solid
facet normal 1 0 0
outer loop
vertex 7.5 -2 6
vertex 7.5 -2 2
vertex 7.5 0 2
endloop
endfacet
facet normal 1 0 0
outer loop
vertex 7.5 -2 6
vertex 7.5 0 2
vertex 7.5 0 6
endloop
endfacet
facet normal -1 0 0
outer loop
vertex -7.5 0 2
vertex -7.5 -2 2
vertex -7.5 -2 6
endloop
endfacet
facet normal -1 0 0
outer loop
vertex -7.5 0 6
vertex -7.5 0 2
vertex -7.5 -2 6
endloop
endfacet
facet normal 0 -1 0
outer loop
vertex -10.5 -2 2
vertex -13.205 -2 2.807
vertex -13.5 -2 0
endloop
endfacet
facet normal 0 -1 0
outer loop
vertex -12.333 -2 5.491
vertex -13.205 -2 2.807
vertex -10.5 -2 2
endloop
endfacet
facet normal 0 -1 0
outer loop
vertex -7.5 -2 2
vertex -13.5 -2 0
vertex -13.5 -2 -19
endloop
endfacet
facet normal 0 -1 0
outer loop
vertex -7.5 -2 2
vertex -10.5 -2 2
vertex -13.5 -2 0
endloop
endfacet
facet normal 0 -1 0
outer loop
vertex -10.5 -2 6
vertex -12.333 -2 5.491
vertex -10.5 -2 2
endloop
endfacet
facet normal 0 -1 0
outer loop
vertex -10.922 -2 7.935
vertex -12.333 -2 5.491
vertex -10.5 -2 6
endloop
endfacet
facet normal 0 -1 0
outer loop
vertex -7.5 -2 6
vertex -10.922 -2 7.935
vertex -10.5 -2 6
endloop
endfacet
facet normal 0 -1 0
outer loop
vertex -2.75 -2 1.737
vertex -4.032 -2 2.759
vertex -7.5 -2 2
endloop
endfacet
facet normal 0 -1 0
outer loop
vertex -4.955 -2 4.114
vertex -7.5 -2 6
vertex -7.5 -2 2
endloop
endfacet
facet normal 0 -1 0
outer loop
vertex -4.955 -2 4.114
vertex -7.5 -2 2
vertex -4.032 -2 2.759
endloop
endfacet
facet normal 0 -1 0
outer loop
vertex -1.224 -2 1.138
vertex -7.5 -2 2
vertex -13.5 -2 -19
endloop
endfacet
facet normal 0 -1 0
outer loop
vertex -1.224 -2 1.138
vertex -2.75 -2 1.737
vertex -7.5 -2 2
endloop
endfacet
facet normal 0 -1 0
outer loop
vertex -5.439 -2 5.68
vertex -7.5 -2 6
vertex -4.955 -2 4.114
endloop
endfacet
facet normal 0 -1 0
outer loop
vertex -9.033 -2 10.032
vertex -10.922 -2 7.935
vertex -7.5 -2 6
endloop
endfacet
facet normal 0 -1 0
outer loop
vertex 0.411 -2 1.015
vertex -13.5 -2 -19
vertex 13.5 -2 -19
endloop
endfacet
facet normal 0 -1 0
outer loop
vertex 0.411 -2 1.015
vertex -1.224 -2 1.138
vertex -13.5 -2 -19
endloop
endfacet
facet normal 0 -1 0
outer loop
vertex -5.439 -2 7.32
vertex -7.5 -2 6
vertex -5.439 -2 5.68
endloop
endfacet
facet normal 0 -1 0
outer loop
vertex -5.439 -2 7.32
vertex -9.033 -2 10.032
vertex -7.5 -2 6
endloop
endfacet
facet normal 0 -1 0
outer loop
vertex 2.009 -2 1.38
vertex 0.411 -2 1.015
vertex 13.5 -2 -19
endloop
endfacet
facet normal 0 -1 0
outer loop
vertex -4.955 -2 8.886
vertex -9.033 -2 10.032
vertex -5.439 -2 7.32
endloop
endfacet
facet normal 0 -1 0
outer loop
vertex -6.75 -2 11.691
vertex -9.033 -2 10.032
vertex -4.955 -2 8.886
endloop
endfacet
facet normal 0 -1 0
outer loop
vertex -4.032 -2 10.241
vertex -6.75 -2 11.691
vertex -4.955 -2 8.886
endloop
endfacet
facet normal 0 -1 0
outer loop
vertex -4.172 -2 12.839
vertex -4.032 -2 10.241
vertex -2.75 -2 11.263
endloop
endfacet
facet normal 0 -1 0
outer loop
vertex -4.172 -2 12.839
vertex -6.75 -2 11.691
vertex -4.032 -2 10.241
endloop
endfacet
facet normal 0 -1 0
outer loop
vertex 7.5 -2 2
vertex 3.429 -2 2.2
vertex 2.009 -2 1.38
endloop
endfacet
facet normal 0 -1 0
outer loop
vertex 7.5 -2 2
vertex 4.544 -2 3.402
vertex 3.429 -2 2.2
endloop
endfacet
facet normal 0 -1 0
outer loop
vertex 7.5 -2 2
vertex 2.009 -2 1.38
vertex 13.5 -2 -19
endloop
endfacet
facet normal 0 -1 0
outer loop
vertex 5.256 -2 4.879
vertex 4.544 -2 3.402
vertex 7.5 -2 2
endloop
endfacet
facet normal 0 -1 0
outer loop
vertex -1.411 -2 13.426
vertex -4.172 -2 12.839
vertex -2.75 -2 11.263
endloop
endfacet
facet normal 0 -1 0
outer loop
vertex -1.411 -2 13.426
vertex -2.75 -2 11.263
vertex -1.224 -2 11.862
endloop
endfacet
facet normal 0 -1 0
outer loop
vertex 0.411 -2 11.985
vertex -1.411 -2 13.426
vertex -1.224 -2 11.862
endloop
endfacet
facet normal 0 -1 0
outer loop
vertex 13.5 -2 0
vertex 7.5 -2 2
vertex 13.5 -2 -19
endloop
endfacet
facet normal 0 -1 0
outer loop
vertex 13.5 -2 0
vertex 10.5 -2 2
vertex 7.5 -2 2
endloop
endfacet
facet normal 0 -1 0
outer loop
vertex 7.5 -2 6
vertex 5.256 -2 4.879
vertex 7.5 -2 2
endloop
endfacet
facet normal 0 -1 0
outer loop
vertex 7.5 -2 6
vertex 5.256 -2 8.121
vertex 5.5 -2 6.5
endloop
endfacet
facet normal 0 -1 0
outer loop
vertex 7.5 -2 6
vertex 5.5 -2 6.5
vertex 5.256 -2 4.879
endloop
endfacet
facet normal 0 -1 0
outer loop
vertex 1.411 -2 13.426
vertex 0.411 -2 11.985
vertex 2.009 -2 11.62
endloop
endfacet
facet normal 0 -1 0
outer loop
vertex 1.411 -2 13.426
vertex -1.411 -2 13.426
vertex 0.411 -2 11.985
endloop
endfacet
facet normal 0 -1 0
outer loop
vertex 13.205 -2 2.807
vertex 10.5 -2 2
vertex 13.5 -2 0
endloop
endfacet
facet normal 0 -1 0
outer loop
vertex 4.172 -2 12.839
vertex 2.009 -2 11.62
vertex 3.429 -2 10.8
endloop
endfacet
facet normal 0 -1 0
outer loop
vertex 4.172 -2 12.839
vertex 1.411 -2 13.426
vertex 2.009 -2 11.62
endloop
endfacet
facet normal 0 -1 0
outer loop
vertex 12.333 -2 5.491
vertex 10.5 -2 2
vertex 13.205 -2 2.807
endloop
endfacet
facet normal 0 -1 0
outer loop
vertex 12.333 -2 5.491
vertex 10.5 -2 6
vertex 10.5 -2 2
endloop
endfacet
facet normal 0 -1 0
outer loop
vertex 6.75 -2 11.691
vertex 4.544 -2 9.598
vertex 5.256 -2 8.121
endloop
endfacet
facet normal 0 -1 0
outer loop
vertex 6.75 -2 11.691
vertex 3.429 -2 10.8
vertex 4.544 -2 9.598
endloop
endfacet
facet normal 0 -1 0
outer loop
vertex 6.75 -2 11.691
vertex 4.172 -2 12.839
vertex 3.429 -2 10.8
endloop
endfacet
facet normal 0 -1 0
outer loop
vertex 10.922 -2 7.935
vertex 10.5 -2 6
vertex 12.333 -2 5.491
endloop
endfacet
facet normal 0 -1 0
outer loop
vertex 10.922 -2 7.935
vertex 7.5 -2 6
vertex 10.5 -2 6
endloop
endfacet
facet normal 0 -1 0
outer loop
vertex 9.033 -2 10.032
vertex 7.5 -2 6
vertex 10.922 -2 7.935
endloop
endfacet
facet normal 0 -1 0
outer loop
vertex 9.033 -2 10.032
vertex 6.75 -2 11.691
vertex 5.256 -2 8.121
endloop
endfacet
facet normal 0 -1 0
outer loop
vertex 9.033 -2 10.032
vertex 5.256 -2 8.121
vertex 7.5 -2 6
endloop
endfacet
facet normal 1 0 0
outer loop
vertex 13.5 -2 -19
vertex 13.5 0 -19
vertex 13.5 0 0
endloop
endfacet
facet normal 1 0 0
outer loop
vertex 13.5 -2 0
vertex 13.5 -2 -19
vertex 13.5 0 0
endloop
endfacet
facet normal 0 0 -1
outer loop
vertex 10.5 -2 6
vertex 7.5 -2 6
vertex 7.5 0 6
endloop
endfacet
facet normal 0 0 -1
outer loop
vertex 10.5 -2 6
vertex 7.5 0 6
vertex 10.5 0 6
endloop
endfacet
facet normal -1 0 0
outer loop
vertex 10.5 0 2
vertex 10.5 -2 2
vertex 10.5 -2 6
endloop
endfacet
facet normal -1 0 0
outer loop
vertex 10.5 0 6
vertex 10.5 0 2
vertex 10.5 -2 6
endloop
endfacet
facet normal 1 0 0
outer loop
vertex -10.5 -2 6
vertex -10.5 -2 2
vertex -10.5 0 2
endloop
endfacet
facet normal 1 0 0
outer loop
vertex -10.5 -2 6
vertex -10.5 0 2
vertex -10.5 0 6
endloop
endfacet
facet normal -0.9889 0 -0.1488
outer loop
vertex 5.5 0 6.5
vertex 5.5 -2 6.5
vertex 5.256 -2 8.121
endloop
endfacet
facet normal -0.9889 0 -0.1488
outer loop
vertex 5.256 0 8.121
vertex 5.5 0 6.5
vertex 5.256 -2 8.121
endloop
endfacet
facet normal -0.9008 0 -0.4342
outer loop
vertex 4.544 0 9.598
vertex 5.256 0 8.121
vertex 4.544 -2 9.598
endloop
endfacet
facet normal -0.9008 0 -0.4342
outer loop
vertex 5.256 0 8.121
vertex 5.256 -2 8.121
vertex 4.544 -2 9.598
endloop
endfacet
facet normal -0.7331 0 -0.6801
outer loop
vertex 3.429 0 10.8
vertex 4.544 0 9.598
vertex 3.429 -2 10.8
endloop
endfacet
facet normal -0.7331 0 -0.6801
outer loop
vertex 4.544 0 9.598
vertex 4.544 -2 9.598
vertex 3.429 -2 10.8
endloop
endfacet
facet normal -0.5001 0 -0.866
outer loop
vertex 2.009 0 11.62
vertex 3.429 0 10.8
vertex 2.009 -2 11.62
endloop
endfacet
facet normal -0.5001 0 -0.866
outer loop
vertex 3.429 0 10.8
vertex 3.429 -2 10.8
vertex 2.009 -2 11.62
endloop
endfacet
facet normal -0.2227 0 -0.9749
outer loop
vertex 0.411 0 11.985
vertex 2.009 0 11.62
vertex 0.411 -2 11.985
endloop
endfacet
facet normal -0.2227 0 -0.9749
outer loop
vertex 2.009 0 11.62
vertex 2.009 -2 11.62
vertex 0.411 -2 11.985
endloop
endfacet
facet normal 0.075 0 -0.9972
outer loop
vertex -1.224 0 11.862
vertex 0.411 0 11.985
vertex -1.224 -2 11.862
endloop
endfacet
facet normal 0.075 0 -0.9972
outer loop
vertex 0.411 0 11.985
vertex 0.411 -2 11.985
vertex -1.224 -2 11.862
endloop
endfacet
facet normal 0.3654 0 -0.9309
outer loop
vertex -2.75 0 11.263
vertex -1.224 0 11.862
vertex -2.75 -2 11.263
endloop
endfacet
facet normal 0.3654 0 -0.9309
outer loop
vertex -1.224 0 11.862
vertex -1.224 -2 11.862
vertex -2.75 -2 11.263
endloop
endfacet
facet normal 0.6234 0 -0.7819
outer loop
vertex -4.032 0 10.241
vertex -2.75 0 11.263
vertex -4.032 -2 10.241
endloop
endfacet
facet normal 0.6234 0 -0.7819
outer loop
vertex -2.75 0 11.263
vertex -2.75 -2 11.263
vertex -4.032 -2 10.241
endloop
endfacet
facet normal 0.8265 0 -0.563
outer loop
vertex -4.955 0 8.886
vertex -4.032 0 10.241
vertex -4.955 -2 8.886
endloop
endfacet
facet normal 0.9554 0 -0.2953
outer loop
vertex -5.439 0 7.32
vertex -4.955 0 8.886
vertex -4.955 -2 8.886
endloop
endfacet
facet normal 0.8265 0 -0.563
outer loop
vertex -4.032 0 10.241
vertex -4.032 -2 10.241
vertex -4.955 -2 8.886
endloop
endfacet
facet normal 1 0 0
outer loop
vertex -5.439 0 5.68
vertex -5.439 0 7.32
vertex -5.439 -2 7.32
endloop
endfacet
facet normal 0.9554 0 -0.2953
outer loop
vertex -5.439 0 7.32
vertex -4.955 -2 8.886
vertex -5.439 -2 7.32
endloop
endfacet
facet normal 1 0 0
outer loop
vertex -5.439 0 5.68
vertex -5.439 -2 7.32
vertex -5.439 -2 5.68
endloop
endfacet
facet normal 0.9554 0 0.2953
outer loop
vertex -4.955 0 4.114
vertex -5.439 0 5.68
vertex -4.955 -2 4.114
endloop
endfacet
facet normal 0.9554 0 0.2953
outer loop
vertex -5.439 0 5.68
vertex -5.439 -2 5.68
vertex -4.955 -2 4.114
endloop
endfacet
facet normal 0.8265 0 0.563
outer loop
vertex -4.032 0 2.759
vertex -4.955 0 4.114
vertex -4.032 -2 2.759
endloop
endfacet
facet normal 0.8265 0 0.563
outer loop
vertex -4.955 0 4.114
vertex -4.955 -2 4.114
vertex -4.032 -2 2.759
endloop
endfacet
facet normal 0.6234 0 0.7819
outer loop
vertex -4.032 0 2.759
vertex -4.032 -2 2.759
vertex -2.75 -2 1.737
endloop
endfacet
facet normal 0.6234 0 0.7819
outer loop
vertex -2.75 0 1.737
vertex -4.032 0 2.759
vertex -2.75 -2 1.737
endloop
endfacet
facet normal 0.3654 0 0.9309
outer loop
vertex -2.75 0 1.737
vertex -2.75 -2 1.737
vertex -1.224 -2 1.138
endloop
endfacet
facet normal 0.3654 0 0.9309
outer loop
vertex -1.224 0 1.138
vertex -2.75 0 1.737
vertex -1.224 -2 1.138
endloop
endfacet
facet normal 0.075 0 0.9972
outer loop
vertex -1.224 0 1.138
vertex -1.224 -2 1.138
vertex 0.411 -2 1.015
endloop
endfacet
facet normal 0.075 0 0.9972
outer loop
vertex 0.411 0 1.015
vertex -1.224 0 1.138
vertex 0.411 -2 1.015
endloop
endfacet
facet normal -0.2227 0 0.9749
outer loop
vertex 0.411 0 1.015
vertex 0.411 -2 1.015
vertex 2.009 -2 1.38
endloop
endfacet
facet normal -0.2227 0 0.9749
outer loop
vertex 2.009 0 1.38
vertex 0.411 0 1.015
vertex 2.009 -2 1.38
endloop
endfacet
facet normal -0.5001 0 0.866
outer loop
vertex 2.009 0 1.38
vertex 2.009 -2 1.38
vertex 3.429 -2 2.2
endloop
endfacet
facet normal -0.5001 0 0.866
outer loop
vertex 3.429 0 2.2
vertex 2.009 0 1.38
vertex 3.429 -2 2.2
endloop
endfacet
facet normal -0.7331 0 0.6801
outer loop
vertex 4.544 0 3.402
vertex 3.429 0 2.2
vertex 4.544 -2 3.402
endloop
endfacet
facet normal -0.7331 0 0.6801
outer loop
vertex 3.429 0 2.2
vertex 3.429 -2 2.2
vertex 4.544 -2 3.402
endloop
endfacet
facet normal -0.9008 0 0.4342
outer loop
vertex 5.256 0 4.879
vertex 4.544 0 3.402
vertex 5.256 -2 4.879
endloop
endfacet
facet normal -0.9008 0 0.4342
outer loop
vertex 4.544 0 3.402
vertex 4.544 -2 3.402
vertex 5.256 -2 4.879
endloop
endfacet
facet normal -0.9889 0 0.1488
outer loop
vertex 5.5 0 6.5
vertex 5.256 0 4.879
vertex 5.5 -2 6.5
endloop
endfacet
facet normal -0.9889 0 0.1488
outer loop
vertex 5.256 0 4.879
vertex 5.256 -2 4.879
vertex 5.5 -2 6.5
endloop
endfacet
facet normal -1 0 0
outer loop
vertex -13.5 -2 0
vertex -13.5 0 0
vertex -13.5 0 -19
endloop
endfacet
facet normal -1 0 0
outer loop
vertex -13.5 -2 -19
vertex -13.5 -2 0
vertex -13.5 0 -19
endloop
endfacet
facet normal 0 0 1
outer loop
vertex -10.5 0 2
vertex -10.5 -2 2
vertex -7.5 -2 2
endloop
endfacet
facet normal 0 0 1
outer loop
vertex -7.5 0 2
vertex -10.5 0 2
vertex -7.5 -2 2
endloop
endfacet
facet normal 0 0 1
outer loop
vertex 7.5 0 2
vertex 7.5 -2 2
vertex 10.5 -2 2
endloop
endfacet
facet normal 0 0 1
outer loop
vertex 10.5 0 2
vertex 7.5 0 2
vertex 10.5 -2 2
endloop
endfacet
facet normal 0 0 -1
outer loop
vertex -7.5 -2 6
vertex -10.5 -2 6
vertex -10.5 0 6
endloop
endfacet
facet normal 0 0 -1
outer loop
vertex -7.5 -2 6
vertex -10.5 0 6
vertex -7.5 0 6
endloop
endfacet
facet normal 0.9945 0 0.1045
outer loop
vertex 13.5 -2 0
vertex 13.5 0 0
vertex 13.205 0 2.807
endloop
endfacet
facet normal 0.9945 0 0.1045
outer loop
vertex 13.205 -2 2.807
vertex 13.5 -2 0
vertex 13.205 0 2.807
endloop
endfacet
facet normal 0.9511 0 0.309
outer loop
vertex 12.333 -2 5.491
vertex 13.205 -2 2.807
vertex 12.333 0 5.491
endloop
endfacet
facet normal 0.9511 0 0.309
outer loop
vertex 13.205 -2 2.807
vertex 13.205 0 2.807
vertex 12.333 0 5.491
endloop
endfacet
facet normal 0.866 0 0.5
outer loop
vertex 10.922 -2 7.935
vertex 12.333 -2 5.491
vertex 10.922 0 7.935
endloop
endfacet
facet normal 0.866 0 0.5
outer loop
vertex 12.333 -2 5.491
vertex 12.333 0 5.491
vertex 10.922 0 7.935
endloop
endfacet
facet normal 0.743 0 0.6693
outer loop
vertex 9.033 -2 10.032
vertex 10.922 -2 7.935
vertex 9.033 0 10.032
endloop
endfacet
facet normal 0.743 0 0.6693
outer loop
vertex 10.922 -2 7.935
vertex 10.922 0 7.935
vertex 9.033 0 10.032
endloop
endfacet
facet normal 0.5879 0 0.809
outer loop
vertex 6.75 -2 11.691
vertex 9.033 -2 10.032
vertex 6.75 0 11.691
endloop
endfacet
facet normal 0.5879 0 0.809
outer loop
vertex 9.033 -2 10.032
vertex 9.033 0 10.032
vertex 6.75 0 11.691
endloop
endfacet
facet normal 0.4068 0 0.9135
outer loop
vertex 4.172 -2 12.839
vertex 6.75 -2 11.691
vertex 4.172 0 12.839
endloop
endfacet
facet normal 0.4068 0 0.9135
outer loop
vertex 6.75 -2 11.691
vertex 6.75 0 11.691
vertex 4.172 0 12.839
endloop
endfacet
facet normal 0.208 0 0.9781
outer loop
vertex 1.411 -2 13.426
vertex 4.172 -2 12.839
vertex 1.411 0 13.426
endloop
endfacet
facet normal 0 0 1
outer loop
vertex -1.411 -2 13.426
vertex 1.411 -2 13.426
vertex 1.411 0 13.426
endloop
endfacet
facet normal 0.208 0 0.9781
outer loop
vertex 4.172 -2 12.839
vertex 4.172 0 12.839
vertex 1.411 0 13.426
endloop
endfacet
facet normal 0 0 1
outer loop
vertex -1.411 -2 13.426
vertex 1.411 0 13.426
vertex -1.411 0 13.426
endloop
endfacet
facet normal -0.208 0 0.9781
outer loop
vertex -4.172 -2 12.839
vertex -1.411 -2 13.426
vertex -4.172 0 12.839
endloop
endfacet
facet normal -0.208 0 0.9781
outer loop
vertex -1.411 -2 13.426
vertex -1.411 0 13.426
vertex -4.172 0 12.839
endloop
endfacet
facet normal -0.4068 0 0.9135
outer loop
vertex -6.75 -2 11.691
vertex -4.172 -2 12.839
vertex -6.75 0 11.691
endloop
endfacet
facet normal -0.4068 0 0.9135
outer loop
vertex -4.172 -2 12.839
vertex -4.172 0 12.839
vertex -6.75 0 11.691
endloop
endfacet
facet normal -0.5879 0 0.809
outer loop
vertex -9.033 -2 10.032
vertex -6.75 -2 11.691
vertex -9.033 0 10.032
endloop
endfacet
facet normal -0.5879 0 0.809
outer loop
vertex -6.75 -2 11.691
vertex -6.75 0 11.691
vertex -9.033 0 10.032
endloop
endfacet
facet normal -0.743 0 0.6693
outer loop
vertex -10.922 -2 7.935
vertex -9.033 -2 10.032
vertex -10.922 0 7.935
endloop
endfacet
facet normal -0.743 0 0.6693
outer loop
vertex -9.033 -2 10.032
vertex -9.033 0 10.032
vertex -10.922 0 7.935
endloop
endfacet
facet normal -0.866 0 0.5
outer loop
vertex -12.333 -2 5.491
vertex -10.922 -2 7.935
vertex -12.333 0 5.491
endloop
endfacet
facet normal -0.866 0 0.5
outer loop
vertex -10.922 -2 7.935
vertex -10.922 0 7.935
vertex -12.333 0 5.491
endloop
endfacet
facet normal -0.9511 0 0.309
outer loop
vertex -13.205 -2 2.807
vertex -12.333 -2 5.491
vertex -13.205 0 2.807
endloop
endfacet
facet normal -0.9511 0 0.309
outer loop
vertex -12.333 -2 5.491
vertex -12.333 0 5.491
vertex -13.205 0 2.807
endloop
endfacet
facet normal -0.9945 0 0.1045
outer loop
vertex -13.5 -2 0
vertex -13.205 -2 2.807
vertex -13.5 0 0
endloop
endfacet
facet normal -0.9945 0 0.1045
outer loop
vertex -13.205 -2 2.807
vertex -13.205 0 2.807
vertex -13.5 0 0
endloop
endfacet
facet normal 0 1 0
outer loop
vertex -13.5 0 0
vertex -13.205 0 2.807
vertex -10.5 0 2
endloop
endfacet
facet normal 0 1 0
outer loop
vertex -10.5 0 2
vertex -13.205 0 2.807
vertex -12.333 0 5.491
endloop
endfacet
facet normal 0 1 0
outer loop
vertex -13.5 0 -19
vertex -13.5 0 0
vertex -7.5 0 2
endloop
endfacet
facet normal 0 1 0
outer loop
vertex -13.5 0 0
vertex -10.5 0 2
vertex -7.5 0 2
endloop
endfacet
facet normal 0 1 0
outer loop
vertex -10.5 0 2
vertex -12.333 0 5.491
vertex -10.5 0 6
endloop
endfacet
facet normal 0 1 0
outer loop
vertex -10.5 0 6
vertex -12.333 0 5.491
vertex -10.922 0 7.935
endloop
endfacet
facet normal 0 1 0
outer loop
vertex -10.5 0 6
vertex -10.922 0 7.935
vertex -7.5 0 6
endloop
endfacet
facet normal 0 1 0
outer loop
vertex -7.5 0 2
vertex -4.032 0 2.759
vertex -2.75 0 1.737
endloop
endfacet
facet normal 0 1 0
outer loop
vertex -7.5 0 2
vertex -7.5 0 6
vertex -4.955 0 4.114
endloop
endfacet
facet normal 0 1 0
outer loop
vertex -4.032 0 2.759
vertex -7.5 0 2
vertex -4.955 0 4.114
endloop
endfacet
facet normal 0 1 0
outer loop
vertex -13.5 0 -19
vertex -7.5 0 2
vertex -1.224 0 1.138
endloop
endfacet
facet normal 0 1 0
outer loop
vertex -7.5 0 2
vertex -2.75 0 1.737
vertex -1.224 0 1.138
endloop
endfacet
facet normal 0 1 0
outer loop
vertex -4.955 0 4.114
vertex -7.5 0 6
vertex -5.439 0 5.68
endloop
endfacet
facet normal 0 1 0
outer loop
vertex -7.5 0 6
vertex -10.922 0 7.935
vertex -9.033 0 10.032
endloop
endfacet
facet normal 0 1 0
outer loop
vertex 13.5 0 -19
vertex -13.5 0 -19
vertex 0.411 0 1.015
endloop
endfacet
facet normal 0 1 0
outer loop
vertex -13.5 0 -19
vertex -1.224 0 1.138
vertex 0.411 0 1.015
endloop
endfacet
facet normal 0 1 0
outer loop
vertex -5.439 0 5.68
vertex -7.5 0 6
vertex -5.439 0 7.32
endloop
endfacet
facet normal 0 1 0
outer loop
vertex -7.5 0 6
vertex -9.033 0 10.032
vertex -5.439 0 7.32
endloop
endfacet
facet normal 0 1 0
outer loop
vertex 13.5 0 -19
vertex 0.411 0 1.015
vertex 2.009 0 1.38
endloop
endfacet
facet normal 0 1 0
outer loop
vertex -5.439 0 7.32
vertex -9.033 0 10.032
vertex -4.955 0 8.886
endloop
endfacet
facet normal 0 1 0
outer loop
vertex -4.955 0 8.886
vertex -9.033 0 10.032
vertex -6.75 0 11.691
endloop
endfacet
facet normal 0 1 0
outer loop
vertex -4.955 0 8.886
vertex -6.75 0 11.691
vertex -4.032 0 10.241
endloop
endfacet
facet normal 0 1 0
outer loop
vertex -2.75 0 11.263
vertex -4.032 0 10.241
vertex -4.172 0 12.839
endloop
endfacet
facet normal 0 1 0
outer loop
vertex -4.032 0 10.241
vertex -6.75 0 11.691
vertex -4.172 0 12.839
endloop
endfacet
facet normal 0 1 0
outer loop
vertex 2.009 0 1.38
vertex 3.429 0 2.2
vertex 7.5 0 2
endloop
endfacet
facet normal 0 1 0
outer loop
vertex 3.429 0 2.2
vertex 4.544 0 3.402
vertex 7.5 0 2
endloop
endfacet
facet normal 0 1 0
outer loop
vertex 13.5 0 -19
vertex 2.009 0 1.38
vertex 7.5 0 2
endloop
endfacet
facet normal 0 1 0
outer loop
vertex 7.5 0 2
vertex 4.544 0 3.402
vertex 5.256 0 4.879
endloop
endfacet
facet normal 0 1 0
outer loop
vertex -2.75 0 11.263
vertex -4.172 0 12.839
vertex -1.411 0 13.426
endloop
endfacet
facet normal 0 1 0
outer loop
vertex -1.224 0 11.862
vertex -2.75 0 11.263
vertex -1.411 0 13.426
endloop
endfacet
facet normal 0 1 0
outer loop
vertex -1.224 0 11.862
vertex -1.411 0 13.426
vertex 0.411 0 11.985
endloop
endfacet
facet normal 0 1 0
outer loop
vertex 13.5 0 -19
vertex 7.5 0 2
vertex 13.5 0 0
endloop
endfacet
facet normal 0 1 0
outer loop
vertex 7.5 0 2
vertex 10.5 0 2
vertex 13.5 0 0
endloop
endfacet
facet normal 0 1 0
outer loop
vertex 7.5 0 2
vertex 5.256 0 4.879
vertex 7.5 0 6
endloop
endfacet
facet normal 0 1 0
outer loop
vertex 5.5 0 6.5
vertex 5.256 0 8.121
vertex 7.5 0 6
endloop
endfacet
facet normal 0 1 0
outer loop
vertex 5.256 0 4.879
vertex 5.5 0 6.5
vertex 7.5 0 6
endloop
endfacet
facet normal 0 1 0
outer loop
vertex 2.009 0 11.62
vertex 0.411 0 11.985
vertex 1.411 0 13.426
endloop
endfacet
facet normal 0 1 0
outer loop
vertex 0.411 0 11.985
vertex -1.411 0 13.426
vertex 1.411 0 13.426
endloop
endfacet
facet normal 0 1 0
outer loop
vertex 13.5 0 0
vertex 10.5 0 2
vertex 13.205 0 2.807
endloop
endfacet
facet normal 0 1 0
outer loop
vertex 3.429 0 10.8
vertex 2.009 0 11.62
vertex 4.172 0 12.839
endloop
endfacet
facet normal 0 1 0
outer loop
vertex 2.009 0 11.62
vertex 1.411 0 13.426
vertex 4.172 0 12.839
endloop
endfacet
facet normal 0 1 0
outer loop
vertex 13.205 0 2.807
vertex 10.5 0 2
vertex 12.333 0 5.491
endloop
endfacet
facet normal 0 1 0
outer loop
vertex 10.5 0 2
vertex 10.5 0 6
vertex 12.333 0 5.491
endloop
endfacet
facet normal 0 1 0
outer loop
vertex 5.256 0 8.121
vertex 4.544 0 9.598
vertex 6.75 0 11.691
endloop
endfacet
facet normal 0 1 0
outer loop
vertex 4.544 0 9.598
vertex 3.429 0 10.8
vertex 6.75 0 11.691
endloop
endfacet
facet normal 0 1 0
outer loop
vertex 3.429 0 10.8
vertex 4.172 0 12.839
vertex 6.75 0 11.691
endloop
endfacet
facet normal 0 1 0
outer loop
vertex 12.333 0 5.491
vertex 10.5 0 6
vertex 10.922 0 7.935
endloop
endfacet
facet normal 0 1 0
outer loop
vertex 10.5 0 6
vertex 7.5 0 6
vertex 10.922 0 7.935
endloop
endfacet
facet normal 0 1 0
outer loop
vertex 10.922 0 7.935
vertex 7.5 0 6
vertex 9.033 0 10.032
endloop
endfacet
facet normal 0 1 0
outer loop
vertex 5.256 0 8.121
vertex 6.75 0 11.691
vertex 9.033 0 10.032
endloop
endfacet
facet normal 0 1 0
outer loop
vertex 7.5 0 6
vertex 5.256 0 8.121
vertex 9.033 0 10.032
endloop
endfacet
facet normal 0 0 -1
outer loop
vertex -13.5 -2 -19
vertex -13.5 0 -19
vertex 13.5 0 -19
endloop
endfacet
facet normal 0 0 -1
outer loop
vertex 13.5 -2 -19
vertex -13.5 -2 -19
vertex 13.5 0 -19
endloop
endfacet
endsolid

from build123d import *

# Parameters (mm, degrees)
F1_DEPTH = 2
F2_R     = 5.5
F2_W     = 3
F2_H     = 4
F3_DEPTH = 2


with BuildPart() as f1:
    # F0 (on Front) → F1 (new body)
    with BuildSketch(Plane.XZ):
        with BuildLine():
            ThreePointArc((-13.5, 0), (0, -13.5), (13.5, 0))
            ThreePointArc((13.5, 0), (0, 13.5), (-13.5, 0))
        make_face()
        with BuildLine():
            Line((13.5, -19), (13.5, 0))
            ThreePointArc((13.5, 0), (0, -13.5), (-13.5, 0))
            Line((-13.5, 0), (-13.5, -19))
            Line((-13.5, -19), (13.5, -19))
        make_face()
    extrude(amount=F1_DEPTH)

    # F2 (on face) → F3 (cut)
    with BuildSketch(Plane.XZ.offset(2)):
        with Locations((0, 6.5)):
            Circle(F2_R)
        with Locations((-9, 4)):
            Rectangle(F2_W, F2_H)
        with Locations((9, 4)):
            Rectangle(F2_W, F2_H)
    extrude(amount=-F3_DEPTH, mode=Mode.SUBTRACT)


solid = f1.part
